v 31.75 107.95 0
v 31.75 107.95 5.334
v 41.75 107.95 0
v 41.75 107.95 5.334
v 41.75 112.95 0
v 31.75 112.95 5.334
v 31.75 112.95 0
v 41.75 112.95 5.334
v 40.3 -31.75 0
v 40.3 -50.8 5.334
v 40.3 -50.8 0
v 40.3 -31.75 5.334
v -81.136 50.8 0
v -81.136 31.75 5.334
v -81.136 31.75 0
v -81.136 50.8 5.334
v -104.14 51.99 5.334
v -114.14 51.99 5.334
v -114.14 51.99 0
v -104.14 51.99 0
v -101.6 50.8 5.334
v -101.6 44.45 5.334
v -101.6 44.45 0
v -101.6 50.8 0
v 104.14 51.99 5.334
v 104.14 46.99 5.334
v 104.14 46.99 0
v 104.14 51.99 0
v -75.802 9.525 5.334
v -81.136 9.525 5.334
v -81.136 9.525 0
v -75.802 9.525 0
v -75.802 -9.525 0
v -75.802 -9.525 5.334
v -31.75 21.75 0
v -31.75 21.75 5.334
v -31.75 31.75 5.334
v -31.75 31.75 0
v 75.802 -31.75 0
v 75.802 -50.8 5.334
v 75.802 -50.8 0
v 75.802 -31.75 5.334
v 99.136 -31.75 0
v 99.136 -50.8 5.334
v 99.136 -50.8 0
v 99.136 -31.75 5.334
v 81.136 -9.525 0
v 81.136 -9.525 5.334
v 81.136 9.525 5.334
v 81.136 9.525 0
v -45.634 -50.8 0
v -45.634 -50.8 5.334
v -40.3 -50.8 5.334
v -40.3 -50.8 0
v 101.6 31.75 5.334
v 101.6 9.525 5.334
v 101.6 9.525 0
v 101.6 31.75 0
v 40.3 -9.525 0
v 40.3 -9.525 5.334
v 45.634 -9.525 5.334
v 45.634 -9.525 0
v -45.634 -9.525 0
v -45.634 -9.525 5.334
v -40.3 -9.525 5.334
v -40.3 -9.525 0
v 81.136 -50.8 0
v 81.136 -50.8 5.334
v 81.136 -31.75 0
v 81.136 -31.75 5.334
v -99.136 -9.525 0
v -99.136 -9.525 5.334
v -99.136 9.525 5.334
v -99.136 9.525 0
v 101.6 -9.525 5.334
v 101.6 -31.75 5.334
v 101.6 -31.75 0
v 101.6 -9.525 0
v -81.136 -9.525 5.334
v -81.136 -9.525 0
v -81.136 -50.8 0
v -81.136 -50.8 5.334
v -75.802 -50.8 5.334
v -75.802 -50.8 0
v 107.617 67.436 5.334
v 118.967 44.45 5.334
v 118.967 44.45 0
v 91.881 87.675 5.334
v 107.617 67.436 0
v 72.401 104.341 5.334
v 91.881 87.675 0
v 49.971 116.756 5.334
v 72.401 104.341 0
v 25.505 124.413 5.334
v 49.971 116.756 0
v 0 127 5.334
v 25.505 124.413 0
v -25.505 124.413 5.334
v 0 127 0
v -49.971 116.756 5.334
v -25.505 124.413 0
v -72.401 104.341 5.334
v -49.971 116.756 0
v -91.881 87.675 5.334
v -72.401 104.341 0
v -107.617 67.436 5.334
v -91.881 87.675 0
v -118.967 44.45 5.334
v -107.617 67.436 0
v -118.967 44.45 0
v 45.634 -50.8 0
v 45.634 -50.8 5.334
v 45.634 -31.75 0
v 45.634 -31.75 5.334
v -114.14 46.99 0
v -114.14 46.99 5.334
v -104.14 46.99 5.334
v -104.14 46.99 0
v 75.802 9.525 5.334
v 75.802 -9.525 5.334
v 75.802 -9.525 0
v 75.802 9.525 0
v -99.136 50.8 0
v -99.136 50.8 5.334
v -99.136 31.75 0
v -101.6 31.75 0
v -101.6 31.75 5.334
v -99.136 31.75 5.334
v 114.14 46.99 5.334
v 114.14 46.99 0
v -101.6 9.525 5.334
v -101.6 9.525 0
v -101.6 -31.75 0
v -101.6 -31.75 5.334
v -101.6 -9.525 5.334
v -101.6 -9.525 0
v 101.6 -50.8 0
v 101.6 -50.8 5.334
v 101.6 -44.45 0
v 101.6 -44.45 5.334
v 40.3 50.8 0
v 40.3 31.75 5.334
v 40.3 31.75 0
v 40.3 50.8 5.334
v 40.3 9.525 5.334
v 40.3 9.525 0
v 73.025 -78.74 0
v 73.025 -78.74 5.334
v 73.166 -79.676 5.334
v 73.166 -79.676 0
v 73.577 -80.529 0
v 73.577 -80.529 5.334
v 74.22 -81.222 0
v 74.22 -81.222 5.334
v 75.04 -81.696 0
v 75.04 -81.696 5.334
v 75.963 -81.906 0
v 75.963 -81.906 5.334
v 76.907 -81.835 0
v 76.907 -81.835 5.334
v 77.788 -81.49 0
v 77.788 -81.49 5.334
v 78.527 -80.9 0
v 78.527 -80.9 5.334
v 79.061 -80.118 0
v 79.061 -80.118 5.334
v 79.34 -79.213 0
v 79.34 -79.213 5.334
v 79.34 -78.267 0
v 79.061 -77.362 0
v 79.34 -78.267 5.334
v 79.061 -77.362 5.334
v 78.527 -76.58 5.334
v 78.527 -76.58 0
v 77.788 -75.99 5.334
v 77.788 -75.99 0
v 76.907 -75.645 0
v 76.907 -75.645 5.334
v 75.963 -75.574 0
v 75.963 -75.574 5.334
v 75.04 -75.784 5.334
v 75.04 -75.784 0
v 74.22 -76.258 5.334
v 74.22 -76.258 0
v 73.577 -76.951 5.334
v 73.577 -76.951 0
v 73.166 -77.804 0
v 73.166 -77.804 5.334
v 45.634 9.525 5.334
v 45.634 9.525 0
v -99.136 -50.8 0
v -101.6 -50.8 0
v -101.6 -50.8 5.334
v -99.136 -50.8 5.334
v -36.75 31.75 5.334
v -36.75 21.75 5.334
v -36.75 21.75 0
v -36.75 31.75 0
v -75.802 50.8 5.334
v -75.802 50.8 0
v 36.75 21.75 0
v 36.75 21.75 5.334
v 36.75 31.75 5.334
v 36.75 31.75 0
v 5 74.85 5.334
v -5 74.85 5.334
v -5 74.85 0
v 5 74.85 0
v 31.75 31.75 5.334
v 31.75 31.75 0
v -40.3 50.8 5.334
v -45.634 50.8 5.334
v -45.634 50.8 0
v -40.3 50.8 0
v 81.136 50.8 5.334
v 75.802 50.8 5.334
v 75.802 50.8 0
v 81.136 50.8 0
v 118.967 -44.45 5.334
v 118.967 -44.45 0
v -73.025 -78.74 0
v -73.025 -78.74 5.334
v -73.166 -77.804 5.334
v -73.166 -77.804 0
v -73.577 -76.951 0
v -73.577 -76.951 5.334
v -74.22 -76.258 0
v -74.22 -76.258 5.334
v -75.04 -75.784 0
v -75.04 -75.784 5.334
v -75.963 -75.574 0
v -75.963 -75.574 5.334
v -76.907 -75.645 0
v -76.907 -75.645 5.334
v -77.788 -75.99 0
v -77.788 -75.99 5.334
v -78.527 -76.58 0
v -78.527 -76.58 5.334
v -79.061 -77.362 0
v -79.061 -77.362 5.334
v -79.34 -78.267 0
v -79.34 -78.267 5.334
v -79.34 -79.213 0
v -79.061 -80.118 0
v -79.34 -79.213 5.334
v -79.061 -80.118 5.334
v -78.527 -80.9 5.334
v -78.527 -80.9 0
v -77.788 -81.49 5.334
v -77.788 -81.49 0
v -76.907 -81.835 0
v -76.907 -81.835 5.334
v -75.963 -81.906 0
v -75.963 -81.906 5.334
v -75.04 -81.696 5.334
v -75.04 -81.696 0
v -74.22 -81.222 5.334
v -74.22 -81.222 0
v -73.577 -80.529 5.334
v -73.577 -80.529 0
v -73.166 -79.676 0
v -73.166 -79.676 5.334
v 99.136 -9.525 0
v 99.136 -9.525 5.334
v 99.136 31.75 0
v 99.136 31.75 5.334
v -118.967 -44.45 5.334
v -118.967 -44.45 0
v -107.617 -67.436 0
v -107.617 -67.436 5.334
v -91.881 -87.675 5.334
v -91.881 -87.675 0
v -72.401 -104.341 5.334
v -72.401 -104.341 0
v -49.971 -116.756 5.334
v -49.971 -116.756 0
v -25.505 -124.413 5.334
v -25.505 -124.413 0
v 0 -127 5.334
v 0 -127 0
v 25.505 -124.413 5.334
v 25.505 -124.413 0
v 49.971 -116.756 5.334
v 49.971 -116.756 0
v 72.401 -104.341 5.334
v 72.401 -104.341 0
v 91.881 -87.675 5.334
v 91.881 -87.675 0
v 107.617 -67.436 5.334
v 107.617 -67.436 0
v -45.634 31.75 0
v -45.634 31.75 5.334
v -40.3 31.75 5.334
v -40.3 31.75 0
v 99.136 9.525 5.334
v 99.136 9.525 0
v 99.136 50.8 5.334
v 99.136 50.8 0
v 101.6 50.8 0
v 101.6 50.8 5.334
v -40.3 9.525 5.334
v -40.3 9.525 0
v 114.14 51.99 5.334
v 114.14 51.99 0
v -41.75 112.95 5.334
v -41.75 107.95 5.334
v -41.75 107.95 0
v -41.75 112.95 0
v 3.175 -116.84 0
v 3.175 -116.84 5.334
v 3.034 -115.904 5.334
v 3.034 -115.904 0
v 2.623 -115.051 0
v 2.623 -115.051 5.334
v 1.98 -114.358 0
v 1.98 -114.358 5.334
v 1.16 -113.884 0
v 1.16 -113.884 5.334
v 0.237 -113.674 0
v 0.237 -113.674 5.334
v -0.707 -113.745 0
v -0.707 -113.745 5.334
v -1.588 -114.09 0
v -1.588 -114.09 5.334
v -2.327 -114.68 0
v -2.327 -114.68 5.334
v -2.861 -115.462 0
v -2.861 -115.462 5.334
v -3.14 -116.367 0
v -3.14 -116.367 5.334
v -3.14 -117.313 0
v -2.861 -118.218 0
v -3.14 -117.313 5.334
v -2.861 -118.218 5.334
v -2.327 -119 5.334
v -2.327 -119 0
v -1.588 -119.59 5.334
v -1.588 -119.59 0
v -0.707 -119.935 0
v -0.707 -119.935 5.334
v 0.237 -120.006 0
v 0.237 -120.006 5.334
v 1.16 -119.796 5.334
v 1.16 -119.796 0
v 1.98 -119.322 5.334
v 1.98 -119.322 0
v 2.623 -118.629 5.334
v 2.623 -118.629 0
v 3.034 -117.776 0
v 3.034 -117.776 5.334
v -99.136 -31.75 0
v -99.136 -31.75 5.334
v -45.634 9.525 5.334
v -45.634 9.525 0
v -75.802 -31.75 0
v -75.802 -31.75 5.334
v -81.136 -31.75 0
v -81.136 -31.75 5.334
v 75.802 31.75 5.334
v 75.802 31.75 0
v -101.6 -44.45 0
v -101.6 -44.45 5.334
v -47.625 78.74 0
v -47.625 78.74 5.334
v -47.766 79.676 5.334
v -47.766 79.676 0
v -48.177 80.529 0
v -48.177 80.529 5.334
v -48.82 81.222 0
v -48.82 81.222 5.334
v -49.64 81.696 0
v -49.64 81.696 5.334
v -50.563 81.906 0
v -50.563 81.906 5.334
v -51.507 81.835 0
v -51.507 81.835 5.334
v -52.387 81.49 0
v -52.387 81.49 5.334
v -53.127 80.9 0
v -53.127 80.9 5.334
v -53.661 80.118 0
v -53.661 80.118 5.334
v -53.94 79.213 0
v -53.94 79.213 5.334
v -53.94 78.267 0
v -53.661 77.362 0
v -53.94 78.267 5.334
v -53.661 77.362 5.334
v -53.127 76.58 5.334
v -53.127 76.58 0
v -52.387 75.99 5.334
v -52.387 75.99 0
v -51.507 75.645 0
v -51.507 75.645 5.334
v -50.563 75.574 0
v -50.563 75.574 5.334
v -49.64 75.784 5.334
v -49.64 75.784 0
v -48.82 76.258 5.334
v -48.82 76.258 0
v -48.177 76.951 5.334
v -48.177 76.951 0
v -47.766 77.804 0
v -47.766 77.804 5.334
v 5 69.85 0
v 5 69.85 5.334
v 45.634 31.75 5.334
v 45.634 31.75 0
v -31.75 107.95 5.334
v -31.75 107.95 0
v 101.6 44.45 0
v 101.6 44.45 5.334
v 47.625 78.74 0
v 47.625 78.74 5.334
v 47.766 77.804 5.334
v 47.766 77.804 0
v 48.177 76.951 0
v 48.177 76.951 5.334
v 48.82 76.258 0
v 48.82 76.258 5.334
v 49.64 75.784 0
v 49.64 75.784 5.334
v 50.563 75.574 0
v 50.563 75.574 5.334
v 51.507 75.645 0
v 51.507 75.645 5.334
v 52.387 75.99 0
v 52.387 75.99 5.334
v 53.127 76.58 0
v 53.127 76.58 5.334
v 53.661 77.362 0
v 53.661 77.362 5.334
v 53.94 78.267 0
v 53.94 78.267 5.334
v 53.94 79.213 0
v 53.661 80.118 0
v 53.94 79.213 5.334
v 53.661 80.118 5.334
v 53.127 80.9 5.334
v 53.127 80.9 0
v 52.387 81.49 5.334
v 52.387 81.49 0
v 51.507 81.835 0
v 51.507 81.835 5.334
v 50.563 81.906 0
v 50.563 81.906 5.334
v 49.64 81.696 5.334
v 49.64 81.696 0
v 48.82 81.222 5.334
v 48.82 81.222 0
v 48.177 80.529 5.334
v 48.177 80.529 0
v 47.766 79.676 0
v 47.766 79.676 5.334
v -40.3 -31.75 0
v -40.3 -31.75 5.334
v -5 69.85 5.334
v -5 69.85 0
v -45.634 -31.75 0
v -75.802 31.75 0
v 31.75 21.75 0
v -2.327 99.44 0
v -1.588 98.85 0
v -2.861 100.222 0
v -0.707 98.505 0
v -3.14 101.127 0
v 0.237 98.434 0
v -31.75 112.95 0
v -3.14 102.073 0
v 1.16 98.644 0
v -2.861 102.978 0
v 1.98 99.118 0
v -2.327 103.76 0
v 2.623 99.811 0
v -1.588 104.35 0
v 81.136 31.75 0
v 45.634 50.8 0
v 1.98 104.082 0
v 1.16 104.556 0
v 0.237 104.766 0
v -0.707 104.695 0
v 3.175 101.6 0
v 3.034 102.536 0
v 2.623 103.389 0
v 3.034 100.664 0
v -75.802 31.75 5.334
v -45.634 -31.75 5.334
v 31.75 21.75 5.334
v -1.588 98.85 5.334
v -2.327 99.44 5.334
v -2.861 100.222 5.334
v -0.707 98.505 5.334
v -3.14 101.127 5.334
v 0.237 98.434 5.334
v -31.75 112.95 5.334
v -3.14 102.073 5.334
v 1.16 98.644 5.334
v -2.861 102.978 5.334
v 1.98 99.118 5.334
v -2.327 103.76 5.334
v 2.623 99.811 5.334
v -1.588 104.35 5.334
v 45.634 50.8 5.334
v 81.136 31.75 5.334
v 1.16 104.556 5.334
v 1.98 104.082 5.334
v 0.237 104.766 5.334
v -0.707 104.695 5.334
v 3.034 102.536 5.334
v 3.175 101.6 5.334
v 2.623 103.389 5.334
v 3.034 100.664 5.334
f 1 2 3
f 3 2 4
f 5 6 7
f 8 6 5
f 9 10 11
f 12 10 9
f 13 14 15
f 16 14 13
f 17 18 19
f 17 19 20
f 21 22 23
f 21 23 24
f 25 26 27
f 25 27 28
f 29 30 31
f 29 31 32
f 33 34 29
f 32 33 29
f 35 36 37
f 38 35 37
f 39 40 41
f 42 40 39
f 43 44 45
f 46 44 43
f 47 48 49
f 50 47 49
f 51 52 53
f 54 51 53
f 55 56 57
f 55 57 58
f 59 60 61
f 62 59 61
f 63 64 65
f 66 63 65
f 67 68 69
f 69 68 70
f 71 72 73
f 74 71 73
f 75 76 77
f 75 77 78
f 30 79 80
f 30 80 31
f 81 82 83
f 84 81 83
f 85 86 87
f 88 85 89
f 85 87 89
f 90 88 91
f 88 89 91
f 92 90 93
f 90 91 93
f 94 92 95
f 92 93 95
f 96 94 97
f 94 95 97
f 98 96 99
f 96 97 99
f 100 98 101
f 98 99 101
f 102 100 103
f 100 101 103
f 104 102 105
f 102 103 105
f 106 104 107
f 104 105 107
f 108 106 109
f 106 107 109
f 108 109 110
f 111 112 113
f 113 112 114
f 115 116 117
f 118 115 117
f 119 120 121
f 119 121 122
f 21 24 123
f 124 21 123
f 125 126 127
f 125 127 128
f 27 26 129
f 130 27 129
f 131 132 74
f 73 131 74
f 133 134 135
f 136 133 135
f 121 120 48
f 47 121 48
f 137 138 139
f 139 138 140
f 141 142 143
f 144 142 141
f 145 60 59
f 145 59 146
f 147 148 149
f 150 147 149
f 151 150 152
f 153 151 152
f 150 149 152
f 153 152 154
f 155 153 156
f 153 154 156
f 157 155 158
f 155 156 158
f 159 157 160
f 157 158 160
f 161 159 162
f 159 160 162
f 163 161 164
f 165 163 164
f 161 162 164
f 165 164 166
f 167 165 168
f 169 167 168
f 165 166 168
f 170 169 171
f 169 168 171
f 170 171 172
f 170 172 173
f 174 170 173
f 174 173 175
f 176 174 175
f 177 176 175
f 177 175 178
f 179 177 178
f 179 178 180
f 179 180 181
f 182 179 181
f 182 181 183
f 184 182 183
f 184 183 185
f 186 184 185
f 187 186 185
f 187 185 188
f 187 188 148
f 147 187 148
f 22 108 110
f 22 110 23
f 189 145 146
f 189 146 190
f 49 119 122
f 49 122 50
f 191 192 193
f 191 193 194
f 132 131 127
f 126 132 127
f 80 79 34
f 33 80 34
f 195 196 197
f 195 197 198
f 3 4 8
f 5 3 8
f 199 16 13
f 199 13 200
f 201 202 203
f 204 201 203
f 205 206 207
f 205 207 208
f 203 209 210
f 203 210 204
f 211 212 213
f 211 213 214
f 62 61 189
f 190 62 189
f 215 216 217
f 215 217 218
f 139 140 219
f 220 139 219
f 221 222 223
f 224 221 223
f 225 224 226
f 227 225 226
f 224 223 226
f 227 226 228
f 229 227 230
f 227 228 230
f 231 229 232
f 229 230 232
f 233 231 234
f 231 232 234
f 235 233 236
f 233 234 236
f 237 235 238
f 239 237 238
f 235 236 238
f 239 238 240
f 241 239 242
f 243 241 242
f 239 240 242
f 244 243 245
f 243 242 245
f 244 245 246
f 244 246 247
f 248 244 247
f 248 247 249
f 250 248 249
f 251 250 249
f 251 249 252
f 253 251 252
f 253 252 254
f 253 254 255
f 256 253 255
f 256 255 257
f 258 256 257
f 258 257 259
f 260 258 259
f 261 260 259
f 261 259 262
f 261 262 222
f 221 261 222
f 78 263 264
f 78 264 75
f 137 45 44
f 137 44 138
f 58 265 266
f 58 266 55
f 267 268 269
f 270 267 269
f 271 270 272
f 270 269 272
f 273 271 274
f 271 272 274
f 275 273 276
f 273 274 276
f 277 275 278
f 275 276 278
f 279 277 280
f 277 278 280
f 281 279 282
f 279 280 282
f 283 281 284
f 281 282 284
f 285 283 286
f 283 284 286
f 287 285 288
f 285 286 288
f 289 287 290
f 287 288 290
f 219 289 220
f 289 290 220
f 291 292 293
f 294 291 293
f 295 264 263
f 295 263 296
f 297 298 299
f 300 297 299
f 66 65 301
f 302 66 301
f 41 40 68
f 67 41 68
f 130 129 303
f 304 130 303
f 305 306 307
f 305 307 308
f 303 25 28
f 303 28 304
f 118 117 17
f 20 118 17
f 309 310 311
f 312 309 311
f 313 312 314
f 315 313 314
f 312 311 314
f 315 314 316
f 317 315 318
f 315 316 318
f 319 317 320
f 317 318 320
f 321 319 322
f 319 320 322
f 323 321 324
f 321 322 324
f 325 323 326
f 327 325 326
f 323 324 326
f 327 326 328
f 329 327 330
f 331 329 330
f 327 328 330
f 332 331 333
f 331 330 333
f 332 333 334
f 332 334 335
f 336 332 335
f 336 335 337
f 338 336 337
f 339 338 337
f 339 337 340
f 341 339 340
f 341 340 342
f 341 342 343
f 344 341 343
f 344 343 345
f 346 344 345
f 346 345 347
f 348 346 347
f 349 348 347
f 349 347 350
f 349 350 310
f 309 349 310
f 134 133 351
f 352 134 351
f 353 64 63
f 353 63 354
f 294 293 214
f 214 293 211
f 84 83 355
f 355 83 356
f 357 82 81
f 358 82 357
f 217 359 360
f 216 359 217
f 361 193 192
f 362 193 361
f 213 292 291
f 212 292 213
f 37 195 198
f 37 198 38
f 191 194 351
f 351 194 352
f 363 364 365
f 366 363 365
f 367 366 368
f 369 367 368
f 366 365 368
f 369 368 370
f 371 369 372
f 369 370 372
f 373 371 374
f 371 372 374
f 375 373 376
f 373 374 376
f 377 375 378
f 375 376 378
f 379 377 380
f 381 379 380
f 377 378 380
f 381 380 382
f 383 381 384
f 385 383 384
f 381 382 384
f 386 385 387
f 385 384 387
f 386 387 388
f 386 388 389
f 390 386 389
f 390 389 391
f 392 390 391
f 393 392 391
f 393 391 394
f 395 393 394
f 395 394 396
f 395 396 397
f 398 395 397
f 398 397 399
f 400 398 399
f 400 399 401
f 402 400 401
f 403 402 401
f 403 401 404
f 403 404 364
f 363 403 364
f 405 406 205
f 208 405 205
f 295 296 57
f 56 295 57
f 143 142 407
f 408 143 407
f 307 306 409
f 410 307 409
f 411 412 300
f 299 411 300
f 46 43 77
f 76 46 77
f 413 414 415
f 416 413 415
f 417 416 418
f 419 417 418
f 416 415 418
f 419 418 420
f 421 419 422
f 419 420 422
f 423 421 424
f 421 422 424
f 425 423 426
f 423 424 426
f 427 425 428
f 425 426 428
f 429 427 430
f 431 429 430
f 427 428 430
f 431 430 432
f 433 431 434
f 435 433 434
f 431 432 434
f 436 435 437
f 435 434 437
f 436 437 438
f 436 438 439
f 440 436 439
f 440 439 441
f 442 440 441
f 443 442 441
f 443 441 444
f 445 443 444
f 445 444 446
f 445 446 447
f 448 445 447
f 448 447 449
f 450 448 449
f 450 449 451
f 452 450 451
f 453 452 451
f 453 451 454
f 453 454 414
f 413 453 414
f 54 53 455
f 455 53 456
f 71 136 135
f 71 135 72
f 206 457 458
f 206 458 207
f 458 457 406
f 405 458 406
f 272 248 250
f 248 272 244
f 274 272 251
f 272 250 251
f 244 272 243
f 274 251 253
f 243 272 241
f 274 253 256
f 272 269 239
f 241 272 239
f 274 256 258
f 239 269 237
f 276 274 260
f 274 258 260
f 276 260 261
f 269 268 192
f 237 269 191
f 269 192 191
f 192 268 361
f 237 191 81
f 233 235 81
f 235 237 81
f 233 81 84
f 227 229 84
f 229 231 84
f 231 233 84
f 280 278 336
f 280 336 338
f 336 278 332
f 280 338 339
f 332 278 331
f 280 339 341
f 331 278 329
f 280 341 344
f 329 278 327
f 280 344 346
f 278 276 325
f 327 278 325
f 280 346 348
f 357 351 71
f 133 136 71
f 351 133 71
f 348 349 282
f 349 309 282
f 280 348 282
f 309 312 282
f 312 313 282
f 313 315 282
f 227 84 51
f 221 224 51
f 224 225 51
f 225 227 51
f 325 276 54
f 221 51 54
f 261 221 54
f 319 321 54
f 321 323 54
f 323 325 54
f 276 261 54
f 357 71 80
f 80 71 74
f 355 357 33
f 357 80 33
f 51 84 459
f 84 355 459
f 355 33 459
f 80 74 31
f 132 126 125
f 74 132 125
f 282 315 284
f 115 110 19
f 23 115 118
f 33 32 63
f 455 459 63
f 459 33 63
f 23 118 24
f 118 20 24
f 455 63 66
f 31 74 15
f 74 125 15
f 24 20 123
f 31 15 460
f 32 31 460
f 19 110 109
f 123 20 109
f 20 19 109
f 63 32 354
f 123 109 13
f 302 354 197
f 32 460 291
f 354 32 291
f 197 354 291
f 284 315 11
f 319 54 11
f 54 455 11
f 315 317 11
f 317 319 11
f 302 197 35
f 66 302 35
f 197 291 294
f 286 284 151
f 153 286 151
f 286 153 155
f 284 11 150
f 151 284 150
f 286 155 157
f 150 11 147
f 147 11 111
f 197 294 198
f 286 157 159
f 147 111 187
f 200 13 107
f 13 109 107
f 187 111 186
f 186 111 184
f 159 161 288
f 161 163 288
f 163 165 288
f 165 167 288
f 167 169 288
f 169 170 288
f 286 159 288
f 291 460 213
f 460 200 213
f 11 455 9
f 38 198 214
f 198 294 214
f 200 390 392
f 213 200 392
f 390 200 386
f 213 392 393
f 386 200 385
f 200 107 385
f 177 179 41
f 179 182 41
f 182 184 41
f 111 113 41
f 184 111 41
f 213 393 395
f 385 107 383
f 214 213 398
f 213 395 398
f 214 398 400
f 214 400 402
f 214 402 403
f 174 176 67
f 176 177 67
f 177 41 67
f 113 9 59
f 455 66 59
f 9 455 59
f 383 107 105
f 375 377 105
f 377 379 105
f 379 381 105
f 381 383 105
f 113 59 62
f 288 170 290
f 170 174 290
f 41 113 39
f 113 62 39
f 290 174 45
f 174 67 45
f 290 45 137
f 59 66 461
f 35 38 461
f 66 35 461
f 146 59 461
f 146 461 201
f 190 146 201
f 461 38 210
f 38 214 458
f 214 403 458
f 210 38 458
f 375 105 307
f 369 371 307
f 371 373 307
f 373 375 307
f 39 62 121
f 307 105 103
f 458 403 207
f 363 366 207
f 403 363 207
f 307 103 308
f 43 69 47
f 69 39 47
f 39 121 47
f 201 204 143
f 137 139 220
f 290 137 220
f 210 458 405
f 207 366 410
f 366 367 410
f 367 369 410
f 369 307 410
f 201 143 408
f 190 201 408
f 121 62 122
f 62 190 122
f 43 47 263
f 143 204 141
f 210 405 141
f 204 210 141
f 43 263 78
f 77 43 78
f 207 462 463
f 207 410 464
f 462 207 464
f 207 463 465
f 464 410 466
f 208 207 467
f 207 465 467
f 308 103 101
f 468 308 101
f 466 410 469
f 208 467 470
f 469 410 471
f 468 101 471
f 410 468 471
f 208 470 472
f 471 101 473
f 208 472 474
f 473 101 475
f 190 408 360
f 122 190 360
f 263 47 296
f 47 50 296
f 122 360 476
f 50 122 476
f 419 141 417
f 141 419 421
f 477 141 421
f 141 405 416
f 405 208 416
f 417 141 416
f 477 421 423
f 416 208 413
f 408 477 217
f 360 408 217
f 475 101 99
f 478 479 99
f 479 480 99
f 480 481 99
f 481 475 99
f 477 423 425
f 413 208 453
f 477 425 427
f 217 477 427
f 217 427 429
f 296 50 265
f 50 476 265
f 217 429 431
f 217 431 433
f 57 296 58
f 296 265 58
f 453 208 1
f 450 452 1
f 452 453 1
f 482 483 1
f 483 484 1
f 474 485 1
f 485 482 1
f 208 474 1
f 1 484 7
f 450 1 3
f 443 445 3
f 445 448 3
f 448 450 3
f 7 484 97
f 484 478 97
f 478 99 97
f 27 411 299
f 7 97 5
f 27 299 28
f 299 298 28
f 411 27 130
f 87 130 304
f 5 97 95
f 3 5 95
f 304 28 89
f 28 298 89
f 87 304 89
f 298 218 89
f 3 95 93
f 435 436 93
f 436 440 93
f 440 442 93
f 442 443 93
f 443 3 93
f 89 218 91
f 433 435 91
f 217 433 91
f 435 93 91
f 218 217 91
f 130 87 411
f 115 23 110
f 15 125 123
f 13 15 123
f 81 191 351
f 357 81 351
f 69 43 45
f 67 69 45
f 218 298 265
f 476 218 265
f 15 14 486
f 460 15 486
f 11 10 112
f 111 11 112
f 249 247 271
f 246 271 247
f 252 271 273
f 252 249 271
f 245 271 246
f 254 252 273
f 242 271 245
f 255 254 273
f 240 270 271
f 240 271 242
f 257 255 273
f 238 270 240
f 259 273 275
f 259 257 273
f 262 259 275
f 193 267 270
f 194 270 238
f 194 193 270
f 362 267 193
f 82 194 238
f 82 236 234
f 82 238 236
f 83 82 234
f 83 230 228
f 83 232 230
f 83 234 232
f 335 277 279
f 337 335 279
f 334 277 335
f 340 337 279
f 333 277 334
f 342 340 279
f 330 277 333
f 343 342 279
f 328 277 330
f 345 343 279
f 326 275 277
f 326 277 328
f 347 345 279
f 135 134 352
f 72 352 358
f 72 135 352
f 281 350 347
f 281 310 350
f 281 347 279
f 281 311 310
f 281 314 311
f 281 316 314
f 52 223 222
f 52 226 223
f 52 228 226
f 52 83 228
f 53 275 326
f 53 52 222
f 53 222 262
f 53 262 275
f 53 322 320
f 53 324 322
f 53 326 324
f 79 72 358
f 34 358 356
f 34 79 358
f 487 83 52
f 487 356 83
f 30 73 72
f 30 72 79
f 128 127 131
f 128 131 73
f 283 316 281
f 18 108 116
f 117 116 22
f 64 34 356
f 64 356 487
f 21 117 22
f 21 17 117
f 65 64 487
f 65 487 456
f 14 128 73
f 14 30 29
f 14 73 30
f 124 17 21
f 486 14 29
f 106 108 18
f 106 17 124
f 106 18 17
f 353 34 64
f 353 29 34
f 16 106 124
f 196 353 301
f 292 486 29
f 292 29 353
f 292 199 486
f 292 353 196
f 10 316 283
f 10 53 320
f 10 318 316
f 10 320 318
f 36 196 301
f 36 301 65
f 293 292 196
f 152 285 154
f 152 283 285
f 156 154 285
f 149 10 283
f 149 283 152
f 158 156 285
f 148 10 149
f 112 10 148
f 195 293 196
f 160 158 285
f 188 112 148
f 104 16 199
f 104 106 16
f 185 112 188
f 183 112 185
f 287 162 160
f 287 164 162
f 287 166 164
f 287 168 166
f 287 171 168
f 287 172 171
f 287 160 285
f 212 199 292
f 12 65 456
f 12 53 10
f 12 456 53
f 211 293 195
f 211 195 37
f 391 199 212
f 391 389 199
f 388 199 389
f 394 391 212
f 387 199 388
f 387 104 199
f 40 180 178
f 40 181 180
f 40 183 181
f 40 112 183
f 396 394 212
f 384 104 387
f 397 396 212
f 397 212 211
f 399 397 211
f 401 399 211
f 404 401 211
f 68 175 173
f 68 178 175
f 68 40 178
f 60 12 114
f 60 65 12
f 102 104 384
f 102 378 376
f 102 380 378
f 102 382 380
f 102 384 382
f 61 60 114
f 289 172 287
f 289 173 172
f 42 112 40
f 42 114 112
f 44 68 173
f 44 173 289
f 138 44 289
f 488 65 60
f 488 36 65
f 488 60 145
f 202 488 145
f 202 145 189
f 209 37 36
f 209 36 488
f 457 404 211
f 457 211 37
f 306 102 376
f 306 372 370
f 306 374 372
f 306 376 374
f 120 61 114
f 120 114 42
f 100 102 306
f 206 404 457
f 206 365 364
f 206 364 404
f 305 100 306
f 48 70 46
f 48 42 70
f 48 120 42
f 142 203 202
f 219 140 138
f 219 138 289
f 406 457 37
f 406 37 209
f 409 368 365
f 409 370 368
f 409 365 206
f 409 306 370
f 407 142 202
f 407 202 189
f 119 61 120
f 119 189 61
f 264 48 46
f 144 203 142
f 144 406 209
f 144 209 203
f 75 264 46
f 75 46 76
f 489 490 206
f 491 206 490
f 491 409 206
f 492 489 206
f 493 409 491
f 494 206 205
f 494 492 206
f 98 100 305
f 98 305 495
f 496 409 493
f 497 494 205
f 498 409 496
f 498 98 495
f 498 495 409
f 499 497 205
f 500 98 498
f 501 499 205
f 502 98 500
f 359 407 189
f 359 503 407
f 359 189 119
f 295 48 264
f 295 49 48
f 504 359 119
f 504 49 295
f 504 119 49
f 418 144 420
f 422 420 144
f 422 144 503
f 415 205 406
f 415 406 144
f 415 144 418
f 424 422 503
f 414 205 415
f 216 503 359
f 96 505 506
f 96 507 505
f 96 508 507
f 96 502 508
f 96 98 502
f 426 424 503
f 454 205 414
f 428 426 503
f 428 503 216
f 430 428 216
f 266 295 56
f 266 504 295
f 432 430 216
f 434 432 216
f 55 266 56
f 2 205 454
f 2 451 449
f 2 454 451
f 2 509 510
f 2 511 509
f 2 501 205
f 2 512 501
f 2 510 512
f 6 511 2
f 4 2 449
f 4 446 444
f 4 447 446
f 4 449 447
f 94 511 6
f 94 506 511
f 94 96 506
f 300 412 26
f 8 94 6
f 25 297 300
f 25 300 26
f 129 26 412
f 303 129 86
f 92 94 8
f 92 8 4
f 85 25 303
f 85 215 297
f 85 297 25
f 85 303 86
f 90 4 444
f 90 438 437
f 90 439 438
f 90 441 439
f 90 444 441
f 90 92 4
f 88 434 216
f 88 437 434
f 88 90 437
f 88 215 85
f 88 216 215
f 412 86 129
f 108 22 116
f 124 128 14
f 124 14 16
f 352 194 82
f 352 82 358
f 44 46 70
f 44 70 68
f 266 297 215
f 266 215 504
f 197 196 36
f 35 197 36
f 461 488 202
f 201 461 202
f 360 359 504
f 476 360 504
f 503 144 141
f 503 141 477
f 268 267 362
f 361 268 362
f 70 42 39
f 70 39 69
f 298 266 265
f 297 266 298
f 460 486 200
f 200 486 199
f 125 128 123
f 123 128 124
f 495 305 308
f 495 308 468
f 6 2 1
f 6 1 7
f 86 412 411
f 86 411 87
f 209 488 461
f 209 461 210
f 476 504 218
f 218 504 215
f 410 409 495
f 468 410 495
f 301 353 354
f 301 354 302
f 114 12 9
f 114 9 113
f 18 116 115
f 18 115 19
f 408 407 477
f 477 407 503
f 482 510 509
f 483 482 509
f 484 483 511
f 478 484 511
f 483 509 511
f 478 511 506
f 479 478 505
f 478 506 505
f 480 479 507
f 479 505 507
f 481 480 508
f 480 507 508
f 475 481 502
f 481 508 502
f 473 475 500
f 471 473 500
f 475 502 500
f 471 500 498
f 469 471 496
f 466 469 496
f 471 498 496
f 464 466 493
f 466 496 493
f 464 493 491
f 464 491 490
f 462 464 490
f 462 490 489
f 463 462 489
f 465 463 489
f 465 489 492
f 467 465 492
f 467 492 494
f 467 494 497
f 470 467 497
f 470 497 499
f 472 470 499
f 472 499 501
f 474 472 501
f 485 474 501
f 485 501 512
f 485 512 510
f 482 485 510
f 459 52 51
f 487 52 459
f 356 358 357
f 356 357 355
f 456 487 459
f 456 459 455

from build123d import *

# Parameters (mm, degrees)
SKETCH1_R            = 127
BODY_DEPTH           = 5.334
SKETCH7_W            = 50.8
SKETCH7_H            = 88.9
WHEELCUTS_DEPTH      = 180.684310823
SKETCH4_W            = 2.4638
SKETCH4_H            = 19.05
SKETCH4_W_2          = 5.334
MOTORMOUNTS_DEPTH    = 175.099537782
SKETCH5_R            = 3.175
CASTOR_DEPTH         = 175.099537782
SKETCH6_R            = 3.175
BOLTHOLES_DEPTH      = 175.099537782
SKETCH3_W            = 10.000000066
SKETCH3_H            = 4.999999906
SKETCH3_W_2          = 5
SKETCH3_H_2          = 10
TAPESENSCUTOUT_DEPTH = 175.099537782


with BuildPart() as part:
    # Sketch1 → Body (new body)
    with BuildSketch(Plane.XY):
        Circle(SKETCH1_R)
    extrude(amount=BODY_DEPTH)

    # Sketch7 → WheelCuts (cut, through all)
    with BuildSketch(Plane.XY.offset(5.334)):
        with Locations((-127, 0)):
            Rectangle(SKETCH7_W, SKETCH7_H)
        with Locations((127, 0)):
            Rectangle(SKETCH7_W, SKETCH7_H)
    extrude(amount=-WHEELCUTS_DEPTH, mode=Mode.SUBTRACT)

    # Sketch4 → MotorMounts (cut, through all)
    with BuildSketch(Plane.XY.offset(5.334)):
        with Locations((-100.3681, 41.275)):
            Rectangle(SKETCH4_W, SKETCH4_H)
        with Locations((-100.3681, -41.275)):
            Rectangle(SKETCH4_W, SKETCH4_H)
        with Locations((-100.3681, 0)):
            Rectangle(SKETCH4_W, SKETCH4_H)
        with Locations((-78.469199932, -41.275)):
            Rectangle(SKETCH4_W_2, SKETCH4_H)
        with Locations((-78.469199932, 41.275)):
            Rectangle(SKETCH4_W_2, SKETCH4_H)
        with Locations((-78.469199932, 0)):
            Rectangle(SKETCH4_W_2, SKETCH4_H)
        with Locations((-42.966999918, -41.275)):
            Rectangle(SKETCH4_W_2, SKETCH4_H)
        with Locations((-42.966999918, 41.275)):
            Rectangle(SKETCH4_W_2, SKETCH4_H)
        with Locations((-42.966999918, 0)):
            Rectangle(SKETCH4_W_2, SKETCH4_H)
        with Locations((42.966999918, -41.275)):
            Rectangle(SKETCH4_W_2, SKETCH4_H)
        with Locations((42.966999918, 0)):
            Rectangle(SKETCH4_W_2, SKETCH4_H)
        with Locations((42.966999918, 41.275)):
            Rectangle(SKETCH4_W_2, SKETCH4_H)
        with Locations((78.469199932, -41.275)):
            Rectangle(SKETCH4_W_2, SKETCH4_H)
        with Locations((78.469199932, 0)):
            Rectangle(SKETCH4_W_2, SKETCH4_H)
        with Locations((78.469199932, 41.275)):
            Rectangle(SKETCH4_W_2, SKETCH4_H)
        with Locations((100.3681, -41.275)):
            Rectangle(SKETCH4_W, SKETCH4_H)
        with Locations((100.3681, 0)):
            Rectangle(SKETCH4_W, SKETCH4_H)
        with Locations((100.3681, 41.275)):
            Rectangle(SKETCH4_W, SKETCH4_H)
    extrude(amount=-MOTORMOUNTS_DEPTH, mode=Mode.SUBTRACT)

    # Sketch5 → Castor (cut, through all)
    with BuildSketch(Plane.XY.offset(5.334)):
        with Locations((0, -116.84)):
            Circle(SKETCH5_R)
        with Locations((0, 101.6)):
            Circle(SKETCH5_R)
    extrude(amount=-CASTOR_DEPTH, mode=Mode.SUBTRACT)

    # Sketch6 → BoltHoles (cut, through all)
    with BuildSketch(Plane.XY.offset(5.334)):
        with Locations((-76.2, -78.74)):
            Circle(SKETCH6_R)
        with Locations((-50.8, 78.74)):
            Circle(SKETCH6_R)
        with Locations(Location((76.2, -78.74, 0), (0, 0, 180))):
            Circle(SKETCH6_R)
        with Locations(Location((50.8, 78.74, 0), (0, 0, 180))):
            Circle(SKETCH6_R)
    extrude(amount=-BOLTHOLES_DEPTH, mode=Mode.SUBTRACT)

    # Sketch3 → TapeSensCutOut (cut, through all)
    with BuildSketch(Plane.XY.offset(5.334)):
        with Locations((-36.750000033, 110.449999953)):
            Rectangle(SKETCH3_W, SKETCH3_H)
        with Locations((-109.140000033, 49.489999953)):
            Rectangle(SKETCH3_W, SKETCH3_H)
        with Locations((36.750000033, 110.449999953)):
            Rectangle(SKETCH3_W, SKETCH3_H)
        with Locations((0, 72.349999953)):
            Rectangle(SKETCH3_W, SKETCH3_H)
        with Locations((109.140000033, 49.489999953)):
            Rectangle(SKETCH3_W, SKETCH3_H)
        with Locations((34.25, 26.75)):
            Rectangle(SKETCH3_W_2, SKETCH3_H_2)
        with Locations((-34.25, 26.75)):
            Rectangle(SKETCH3_W_2, SKETCH3_H_2)
    extrude(amount=-TAPESENSCUTOUT_DEPTH, mode=Mode.SUBTRACT)


solid = part.part
